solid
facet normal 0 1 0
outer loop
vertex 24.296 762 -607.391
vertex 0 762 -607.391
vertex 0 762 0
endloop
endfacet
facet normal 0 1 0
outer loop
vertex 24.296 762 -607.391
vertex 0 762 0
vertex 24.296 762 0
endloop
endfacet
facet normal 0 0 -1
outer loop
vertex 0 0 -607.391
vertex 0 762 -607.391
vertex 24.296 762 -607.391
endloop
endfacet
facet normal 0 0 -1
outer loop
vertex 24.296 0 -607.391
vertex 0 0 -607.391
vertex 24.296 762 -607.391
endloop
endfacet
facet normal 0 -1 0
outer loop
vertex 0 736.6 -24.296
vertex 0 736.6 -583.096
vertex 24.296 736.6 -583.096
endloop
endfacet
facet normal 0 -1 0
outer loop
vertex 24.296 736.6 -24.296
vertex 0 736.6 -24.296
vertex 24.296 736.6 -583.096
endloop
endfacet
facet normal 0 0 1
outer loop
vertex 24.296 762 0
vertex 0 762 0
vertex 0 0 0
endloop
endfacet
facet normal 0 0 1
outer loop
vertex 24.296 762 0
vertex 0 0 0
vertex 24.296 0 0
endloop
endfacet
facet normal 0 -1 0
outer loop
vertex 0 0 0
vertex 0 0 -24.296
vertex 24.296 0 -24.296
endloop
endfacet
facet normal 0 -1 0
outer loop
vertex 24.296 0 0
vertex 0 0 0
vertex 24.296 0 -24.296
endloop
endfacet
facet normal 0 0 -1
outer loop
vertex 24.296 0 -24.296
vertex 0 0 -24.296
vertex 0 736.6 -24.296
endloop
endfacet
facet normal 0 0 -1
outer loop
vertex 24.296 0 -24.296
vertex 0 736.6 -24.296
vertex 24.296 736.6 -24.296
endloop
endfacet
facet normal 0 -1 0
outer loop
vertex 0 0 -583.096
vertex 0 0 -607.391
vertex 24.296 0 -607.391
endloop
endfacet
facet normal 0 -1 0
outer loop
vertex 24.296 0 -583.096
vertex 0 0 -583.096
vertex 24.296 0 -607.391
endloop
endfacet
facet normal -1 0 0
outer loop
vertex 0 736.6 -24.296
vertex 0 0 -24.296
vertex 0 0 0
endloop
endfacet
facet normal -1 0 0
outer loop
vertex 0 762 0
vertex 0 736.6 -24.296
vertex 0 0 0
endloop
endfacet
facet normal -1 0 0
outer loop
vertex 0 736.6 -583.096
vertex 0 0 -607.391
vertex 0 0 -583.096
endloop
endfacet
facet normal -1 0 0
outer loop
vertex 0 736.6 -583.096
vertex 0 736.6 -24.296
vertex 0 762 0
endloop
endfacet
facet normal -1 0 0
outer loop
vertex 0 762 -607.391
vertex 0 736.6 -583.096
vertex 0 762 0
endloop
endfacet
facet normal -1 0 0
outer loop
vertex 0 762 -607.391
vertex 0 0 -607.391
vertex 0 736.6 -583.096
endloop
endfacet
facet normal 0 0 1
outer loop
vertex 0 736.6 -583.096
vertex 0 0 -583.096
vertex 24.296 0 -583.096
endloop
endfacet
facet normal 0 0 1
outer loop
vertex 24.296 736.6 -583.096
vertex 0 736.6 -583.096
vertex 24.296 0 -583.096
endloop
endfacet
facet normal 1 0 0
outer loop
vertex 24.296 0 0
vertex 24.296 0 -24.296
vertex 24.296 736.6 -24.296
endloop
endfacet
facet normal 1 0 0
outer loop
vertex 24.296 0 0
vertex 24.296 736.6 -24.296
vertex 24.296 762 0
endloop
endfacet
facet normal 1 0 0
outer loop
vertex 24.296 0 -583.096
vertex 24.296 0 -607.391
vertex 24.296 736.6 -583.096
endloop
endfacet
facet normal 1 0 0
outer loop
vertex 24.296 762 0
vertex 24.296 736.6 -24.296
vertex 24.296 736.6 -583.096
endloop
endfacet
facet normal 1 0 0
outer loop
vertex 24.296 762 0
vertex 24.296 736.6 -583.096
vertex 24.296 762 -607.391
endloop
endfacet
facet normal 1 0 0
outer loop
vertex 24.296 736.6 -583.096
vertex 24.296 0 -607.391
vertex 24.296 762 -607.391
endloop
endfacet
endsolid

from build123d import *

# Parameters (mm, degrees)
SKETCH2_W             = 24.295652174
SKETCH2_H             = 24.295652174
BOSS_EXTRUDE1_DEPTH   = 762
BOSS_EXTRUDE1_2_DEPTH = 762
SKETCH3_W             = 24.295652174
SKETCH3_H             = 25.4
BOSS_EXTRUDE2_DEPTH   = 558.8


with BuildPart() as part:
    # Sketch2 → Boss-Extrude1 (new body)
    with BuildSketch(Plane(origin=(0, 0, 0), x_dir=(1, 0, 0), z_dir=(0, 1, 0))):
        with Locations((12.147826087, 12.147826087)):
            Rectangle(SKETCH2_W, SKETCH2_H)
    extrude(amount=BOSS_EXTRUDE1_DEPTH)



with BuildPart() as body_2:
    # Sketch2 → Boss-Extrude1 2 (new body)
    with BuildSketch(Plane(origin=(0, 0, 0), x_dir=(1, 0, 0), z_dir=(0, 1, 0))):
        with Locations((12.147826087, 595.243478261)):
            Rectangle(SKETCH2_W, SKETCH2_H)
    extrude(amount=BOSS_EXTRUDE1_2_DEPTH)


with BuildPart() as part_1:
    add(part.part)

    add(body_2.part)  # Boss-Extrude2 merges body 2
    # Sketch3 → Boss-Extrude2 (add)
    with BuildSketch(Plane.XY.offset(-583.095652174)):
        with Locations((12.147826087, 749.3)):
            Rectangle(SKETCH3_W, SKETCH3_H)
    extrude(amount=BOSS_EXTRUDE2_DEPTH)


solid = part_1.part
